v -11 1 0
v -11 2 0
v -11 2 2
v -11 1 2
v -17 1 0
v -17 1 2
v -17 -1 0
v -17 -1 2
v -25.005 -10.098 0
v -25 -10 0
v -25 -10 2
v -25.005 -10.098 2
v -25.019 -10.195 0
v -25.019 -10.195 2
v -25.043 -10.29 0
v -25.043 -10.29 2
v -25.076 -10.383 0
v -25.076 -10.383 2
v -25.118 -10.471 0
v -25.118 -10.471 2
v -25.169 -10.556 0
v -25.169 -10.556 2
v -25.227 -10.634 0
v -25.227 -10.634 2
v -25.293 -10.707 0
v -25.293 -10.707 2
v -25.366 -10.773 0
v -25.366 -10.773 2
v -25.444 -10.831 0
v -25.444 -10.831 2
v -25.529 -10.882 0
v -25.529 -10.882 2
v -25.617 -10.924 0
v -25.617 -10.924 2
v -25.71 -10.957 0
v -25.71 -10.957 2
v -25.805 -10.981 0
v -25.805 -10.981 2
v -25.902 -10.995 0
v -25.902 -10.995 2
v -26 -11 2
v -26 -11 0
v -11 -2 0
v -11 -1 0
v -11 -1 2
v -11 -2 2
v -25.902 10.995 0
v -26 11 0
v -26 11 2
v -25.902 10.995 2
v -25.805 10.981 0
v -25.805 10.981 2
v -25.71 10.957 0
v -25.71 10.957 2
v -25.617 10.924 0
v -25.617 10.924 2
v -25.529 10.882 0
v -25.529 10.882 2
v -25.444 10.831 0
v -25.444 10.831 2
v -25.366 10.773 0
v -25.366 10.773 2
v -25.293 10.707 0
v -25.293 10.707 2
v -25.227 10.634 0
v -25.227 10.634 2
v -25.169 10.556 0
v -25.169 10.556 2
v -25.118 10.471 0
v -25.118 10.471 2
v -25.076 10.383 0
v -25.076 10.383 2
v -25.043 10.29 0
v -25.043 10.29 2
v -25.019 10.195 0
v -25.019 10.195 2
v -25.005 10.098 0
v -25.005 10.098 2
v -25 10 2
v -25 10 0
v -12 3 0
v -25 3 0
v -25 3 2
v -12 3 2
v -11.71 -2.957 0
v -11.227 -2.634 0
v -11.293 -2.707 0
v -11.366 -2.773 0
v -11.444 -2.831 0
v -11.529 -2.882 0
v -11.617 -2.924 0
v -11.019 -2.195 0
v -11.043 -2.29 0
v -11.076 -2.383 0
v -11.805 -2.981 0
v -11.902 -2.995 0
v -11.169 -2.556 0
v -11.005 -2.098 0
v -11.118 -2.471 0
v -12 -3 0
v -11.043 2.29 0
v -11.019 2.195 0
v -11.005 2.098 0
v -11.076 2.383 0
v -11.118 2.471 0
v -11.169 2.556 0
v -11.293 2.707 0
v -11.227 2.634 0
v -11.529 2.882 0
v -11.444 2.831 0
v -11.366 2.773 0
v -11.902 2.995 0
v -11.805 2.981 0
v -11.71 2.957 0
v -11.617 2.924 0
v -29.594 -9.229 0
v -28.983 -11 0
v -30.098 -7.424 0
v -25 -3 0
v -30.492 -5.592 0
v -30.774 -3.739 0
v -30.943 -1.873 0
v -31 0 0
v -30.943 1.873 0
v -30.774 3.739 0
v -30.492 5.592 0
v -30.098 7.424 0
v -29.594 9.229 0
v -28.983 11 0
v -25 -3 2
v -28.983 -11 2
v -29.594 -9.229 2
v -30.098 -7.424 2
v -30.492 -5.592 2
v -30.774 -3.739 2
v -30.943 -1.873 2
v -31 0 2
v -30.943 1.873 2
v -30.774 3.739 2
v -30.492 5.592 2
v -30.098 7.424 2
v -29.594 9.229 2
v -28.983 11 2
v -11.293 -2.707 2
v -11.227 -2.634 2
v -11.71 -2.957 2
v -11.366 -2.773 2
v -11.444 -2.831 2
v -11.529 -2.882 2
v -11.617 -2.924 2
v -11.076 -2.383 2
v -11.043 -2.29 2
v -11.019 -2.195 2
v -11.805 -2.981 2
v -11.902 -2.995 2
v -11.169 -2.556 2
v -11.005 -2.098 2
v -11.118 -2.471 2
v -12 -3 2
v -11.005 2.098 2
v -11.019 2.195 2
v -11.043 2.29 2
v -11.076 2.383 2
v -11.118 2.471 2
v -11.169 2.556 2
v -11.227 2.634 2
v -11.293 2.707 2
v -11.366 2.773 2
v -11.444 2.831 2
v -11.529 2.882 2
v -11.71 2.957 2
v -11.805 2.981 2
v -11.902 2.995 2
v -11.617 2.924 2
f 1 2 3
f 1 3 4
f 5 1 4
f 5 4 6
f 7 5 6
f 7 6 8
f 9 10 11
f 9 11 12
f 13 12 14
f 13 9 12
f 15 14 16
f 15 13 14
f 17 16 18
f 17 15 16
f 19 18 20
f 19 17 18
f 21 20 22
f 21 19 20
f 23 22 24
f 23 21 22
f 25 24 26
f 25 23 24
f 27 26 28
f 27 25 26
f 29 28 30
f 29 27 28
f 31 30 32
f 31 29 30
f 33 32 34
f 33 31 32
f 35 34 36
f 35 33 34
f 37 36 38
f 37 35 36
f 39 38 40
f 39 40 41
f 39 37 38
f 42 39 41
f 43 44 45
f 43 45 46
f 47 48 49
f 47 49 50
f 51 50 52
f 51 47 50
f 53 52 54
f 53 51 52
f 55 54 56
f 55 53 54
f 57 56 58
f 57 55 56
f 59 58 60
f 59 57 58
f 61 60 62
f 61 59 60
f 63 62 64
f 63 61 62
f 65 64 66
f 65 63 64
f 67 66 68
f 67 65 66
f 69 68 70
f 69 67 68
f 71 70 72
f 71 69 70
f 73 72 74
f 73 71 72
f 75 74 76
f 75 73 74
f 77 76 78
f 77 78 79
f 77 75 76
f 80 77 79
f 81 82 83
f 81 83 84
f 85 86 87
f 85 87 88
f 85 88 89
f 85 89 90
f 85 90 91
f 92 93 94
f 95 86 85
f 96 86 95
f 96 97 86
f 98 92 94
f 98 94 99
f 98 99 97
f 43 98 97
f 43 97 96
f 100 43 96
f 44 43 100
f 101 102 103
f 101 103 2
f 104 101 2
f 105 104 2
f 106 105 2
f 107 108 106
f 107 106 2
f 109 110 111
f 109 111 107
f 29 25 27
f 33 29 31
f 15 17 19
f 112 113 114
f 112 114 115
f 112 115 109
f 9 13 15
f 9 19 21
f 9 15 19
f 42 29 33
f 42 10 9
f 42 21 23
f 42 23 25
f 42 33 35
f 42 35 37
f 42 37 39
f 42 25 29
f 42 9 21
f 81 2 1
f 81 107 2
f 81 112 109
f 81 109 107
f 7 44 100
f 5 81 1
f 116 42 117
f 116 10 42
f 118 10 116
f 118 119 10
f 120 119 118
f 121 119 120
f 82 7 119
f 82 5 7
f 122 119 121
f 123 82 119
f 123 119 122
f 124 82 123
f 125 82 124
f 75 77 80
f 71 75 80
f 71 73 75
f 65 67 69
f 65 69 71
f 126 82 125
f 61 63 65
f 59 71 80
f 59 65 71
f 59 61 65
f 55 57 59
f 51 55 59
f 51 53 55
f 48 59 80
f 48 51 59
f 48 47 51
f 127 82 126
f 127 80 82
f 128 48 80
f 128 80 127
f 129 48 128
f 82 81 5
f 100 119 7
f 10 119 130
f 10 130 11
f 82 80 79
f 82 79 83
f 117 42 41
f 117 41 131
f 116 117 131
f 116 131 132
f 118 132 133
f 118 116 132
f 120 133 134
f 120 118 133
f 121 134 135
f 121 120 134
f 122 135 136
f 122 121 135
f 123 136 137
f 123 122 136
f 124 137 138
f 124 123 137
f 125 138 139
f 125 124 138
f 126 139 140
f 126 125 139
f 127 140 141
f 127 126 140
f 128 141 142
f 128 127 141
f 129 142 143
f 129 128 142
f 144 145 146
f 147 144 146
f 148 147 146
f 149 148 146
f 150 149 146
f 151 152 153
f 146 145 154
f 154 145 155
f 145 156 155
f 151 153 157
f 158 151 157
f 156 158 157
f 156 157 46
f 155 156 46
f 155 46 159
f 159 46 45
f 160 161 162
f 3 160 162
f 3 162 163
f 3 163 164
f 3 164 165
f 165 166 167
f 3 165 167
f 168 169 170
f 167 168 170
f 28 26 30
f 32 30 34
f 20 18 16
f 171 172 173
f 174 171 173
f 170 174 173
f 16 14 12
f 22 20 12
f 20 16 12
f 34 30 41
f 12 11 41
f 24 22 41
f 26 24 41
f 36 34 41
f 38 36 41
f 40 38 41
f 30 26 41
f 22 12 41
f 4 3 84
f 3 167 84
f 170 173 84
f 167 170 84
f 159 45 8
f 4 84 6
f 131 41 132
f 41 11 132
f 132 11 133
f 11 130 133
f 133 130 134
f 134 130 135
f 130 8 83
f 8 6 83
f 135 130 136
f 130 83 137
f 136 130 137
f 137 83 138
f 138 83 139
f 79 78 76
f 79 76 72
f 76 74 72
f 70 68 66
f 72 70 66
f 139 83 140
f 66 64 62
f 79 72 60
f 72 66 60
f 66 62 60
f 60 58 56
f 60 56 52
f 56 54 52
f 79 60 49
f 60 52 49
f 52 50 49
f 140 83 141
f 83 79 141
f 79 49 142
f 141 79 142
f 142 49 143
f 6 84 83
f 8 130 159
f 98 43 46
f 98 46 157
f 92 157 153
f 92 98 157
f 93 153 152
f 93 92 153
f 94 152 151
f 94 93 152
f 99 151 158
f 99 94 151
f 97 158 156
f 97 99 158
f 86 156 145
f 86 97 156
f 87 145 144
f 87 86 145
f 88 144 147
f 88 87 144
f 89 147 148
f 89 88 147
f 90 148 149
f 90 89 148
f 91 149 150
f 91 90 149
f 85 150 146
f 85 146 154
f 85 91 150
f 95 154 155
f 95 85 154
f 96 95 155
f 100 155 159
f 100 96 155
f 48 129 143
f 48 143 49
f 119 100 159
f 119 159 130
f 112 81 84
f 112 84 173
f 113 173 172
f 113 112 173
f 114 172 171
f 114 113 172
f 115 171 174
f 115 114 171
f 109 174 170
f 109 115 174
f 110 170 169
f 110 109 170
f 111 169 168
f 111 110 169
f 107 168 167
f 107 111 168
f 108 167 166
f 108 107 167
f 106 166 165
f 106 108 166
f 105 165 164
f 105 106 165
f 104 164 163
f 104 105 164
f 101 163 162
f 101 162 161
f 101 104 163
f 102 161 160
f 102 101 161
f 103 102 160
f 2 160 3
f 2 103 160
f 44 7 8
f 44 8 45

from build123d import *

# Parameters (mm, degrees)
BOSS_EXTRUDE1_DEPTH = 2


with BuildPart() as part:
    # Sketch1 → Boss-Extrude1 (new body)
    with BuildSketch(Plane.XY):
        with BuildLine():
            Line((-24.999999472, 3), (-12, 3))
            ThreePointArc((-12, 3), (-11.292893219, 2.707106781), (-11, 2))
            Line((-11, 2), (-11, 1))
            Line((-11, 1), (-17, 1))
            Line((-17, 1), (-17, -1))
            Line((-17, -1), (-11, -1))
            Line((-11, -1), (-11, -2))
            ThreePointArc((-11, -2), (-11.292893219, -2.707106781), (-12, -3))
            Line((-12, -3), (-24.999999472, -3))
            Line((-24.999999472, -3), (-24.999999472, -10))
            ThreePointArc((-24.999999472, -10), (-25.292892691, -10.707106781), (-25.999999472, -11))
            Line((-25.999999472, -11), (-28.982753492, -11))
            ThreePointArc((-28.982753492, -11), (-31, 0), (-28.982753492, 11))
            Line((-28.982753492, 11), (-25.999999472, 11))
            ThreePointArc((-25.999999472, 11), (-25.292892691, 10.707106781), (-24.999999472, 10))
            Line((-24.999999472, 10), (-24.999999472, 3))
        make_face()
    extrude(amount=BOSS_EXTRUDE1_DEPTH)


solid = part.part
